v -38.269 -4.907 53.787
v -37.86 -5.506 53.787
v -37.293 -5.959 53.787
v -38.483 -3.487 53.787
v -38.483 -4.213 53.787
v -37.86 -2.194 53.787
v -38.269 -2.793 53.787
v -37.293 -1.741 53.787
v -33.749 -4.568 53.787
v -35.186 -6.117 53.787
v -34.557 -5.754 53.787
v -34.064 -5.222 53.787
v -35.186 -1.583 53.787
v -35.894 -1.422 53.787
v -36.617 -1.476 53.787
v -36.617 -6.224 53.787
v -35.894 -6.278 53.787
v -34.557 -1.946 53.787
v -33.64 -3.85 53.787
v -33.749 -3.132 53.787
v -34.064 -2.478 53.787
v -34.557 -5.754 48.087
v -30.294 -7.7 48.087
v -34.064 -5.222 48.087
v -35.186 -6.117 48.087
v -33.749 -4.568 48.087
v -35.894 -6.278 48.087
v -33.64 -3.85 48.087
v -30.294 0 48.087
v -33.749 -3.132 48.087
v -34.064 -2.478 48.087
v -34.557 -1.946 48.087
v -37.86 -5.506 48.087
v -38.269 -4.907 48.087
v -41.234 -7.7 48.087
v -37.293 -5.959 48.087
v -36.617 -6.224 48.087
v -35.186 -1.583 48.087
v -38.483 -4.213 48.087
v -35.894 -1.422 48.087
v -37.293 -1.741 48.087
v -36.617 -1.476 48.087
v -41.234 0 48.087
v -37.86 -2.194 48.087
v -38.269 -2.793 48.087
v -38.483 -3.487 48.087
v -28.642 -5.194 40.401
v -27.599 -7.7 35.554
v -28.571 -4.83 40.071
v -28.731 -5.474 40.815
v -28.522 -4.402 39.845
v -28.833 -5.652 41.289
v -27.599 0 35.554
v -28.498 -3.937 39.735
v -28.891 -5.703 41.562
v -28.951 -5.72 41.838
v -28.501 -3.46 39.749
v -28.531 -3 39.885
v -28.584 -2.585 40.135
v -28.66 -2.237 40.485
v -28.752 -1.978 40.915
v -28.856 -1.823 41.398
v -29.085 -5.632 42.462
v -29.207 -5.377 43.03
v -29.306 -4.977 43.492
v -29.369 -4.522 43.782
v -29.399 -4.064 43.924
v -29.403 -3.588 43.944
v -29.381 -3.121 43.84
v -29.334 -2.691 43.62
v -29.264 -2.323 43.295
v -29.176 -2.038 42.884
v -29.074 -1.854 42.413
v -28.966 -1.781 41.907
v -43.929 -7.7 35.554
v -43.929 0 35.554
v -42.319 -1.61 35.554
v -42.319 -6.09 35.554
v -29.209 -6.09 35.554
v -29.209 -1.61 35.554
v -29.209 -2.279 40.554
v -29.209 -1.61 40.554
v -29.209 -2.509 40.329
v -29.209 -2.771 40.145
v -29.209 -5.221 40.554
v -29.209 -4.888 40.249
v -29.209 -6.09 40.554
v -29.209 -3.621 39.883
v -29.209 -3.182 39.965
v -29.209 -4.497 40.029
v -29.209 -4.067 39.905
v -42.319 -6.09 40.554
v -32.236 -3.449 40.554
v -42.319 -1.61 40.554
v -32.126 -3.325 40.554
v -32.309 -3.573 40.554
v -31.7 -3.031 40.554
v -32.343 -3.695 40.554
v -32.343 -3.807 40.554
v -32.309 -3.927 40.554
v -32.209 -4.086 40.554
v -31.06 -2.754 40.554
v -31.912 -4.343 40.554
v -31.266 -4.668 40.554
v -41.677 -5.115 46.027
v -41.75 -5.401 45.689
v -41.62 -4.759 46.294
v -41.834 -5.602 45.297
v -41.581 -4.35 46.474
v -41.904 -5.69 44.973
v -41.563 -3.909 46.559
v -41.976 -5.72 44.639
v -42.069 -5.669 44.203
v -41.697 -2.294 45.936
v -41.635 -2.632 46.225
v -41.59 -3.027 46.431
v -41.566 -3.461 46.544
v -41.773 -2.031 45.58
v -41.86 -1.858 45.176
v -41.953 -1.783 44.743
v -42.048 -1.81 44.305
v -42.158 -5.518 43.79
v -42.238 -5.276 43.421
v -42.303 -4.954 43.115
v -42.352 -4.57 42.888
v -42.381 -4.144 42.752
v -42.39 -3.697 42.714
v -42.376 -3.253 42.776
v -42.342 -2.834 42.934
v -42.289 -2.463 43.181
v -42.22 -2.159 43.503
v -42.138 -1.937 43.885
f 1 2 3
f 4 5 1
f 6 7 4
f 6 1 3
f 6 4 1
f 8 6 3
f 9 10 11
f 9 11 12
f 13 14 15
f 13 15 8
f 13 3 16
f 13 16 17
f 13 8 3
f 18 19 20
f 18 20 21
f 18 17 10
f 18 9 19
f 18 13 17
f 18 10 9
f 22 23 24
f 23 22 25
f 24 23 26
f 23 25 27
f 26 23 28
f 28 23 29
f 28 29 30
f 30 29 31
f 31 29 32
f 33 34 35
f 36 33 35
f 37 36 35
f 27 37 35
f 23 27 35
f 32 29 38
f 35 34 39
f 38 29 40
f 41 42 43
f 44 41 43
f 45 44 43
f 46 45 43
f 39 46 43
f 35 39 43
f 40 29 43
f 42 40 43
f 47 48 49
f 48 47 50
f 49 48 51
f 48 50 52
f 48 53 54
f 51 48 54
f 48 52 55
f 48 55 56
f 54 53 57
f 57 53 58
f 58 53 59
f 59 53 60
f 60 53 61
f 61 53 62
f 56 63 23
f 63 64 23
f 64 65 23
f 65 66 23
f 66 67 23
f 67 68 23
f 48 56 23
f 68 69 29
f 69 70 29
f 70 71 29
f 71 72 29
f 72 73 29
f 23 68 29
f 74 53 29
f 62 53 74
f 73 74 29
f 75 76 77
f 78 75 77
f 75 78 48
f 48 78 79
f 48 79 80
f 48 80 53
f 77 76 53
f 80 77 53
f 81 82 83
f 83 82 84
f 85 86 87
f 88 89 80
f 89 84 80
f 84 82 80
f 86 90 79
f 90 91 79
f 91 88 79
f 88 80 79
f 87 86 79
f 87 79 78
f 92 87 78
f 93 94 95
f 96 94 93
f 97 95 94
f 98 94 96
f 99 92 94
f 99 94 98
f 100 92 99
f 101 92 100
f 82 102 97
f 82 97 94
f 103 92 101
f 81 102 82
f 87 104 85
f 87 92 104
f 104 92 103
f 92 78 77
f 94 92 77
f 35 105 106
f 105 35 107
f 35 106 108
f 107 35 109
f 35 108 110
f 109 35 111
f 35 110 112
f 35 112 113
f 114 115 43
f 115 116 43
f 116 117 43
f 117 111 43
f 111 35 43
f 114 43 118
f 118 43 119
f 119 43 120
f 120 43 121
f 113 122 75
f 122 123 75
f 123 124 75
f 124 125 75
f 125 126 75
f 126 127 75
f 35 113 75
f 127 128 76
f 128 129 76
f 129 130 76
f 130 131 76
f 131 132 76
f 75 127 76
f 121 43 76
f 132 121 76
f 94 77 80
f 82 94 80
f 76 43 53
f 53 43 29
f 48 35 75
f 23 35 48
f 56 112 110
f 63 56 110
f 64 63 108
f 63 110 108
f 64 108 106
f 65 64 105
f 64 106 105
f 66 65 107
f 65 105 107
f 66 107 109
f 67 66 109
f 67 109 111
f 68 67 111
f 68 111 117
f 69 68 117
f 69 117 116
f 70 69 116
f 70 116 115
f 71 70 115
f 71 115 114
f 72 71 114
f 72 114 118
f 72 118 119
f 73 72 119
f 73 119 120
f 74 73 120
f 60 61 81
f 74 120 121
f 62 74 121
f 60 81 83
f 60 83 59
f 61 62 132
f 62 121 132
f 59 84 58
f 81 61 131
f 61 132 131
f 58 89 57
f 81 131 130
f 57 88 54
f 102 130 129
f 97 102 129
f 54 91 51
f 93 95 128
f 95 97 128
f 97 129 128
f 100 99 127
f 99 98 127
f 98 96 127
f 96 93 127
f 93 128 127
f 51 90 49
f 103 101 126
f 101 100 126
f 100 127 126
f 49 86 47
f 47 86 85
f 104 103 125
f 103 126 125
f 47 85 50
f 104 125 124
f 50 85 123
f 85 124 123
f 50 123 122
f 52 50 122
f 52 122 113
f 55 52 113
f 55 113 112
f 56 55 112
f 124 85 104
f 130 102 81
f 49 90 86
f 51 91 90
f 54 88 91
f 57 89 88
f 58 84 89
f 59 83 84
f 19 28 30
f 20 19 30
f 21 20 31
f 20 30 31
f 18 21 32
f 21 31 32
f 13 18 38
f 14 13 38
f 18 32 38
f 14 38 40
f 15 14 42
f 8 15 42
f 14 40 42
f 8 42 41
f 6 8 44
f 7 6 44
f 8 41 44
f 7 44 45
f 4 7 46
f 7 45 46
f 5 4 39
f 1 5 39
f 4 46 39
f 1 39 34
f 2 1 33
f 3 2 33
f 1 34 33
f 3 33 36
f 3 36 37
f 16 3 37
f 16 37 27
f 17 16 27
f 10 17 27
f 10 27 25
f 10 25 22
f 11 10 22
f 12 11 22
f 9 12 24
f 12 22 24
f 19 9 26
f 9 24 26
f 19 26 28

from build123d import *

# Parameters (mm, degrees)
F1_DEPTH = 7.7
F2_R     = 1.97
F3_DEPTH = 25
F4_R     = 2.435
F5_DEPTH = 5.7
F7_DEPTH = 5


with BuildPart() as f1:
    # F0 (on Front) → F1 (new body)
    with BuildSketch(Plane.XZ):
        Polygon((-30.294312, 48.087149), (-41.234312, 48.087149), (-43.929312, 35.553619), (-27.599312, 35.553619), align=None)
    extrude(amount=F1_DEPTH)

    # F2 (on face) → F3 (cut)
    with BuildSketch(Plane(origin=(-49.295012, 0, 10.599572), x_dir=(0, -1, 0), z_dir=(-0.977654, 0, 0.210218))):
        with Locations((3.75, 34.817591)):
            Circle(F2_R)
    extrude(amount=-F3_DEPTH, mode=Mode.SUBTRACT)

    # F4 (on face) → F5 (join)
    with BuildSketch(Plane.XY.offset(48.087149)):
        with Locations((-36.07548, -3.85)):
            Circle(F4_R)
    extrude(amount=F5_DEPTH)

    # F6 (on face) → F7 (cut)
    with BuildSketch(Plane(origin=(0, 0, 35.553619), x_dir=(1, 0, 0), z_dir=(0, 0, -1))):
        Polygon((-37.525672, 2.131142), (-37.894156, 1.61), (-37.184659, 1.61), (-37.184659, 2.131142), align=None)
        Polygon((-34.179285, 2.131142), (-34.179285, 1.61), (-33.376172, 1.61), (-33.782143, 2.131142), align=None)
        Polygon((-37.184659, 6.09), (-37.894156, 6.09), (-37.525672, 5.577996), (-37.184659, 5.577996), align=None)
        Polygon((-33.376172, 6.09), (-34.179285, 6.09), (-34.179285, 5.577996), (-33.782143, 5.577996), align=None)
        Polygon((-37.894156, 6.09), (-42.319312, 6.09), (-42.319312, 1.61), (-37.894156, 1.61), (-37.525672, 2.131142), (-37.184659, 2.131142), (-37.184659, 1.61), (-34.179285, 1.61), (-34.179285, 2.131142), (-33.782143, 2.131142), (-33.376172, 1.61), (-29.209312, 1.61), (-29.209312, 6.09), (-33.376172, 6.09), (-33.782143, 5.577996), (-34.179285, 5.577996), (-34.179285, 6.09), (-37.184659, 6.09), (-37.184659, 5.577996), (-37.525672, 5.577996), align=None)
    extrude(amount=-F7_DEPTH, mode=Mode.SUBTRACT)


solid = f1.part
